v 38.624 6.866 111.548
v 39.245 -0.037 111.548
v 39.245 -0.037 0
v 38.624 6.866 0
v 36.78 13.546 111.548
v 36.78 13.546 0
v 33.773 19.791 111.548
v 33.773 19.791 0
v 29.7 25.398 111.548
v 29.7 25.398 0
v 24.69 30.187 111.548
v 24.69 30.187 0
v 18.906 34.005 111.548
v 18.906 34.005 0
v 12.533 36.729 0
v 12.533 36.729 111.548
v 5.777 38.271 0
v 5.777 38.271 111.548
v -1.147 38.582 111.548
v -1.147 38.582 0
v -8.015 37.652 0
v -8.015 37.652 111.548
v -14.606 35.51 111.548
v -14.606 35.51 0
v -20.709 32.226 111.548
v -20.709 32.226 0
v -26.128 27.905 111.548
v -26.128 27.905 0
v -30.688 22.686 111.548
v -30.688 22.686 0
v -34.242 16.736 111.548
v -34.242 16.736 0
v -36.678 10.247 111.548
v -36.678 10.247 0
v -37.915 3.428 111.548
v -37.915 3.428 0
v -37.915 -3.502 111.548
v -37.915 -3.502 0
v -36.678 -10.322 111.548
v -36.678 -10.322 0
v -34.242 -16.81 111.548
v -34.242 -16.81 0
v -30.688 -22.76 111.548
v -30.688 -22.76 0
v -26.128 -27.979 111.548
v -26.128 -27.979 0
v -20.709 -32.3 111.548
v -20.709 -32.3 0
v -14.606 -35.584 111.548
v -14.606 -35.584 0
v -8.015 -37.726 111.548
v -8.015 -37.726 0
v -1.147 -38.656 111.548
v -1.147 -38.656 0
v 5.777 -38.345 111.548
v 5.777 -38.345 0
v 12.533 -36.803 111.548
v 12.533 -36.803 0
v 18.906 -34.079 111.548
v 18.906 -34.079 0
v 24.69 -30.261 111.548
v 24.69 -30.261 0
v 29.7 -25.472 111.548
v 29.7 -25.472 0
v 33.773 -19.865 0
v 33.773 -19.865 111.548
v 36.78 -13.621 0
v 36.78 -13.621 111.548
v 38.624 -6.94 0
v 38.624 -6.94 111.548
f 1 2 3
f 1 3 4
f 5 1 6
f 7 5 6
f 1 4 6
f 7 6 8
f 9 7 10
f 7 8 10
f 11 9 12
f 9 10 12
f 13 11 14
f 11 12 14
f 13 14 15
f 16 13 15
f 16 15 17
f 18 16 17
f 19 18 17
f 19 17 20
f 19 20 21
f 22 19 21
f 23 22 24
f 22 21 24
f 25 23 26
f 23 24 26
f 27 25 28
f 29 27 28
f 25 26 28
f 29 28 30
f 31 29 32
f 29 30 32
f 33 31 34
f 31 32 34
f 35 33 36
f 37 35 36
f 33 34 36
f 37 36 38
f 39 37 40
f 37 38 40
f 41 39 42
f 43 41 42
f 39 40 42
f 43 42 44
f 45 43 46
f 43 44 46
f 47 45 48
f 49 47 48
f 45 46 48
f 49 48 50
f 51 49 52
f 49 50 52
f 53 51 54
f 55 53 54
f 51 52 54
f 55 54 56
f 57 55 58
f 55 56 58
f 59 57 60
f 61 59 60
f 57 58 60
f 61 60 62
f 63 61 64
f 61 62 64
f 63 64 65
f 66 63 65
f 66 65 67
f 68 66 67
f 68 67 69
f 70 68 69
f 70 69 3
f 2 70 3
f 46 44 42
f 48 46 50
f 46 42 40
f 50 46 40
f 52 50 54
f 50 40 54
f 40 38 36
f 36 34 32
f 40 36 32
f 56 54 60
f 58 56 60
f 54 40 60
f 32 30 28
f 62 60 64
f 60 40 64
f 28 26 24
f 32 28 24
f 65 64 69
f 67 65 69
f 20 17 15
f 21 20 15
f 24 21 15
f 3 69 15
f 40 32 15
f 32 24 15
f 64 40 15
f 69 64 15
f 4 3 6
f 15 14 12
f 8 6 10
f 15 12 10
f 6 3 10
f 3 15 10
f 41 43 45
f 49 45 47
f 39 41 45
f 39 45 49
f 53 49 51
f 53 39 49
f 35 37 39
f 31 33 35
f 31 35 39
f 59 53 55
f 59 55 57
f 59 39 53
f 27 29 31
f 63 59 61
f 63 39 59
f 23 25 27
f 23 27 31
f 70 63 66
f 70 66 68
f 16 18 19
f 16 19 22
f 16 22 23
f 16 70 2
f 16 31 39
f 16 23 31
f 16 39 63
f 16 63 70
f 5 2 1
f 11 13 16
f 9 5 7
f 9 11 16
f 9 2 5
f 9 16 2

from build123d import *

# Parameters (mm, degrees)
F0_R     = 38.6580677432
F1_DEPTH = 60.7483312488
F2_DEPTH = 25.4
F3_DEPTH = 25.4


with BuildPart() as f1:
    # F0 (on Top) → F1 (new body)
    with BuildSketch(Plane.XY):
        with Locations((0.5874064986, -0.0370815396)):
            Circle(F0_R)
    extrude(amount=F1_DEPTH)

    # F2 (add): a face of the model
    f2_faces = [f1.faces().sort_by_distance(p)[0] for p in [
        (0.5874064986, -0.0370815396, 60.7483312488),
    ]]
    extrude(f2_faces, amount=F2_DEPTH)

    # F3 (add): a face of the model
    f3_faces = [f1.faces().sort_by_distance(p)[0] for p in [
        (0.5874064986, -0.0370815396, 86.1483312488),
    ]]
    extrude(f3_faces, amount=F3_DEPTH)


solid = f1.part
